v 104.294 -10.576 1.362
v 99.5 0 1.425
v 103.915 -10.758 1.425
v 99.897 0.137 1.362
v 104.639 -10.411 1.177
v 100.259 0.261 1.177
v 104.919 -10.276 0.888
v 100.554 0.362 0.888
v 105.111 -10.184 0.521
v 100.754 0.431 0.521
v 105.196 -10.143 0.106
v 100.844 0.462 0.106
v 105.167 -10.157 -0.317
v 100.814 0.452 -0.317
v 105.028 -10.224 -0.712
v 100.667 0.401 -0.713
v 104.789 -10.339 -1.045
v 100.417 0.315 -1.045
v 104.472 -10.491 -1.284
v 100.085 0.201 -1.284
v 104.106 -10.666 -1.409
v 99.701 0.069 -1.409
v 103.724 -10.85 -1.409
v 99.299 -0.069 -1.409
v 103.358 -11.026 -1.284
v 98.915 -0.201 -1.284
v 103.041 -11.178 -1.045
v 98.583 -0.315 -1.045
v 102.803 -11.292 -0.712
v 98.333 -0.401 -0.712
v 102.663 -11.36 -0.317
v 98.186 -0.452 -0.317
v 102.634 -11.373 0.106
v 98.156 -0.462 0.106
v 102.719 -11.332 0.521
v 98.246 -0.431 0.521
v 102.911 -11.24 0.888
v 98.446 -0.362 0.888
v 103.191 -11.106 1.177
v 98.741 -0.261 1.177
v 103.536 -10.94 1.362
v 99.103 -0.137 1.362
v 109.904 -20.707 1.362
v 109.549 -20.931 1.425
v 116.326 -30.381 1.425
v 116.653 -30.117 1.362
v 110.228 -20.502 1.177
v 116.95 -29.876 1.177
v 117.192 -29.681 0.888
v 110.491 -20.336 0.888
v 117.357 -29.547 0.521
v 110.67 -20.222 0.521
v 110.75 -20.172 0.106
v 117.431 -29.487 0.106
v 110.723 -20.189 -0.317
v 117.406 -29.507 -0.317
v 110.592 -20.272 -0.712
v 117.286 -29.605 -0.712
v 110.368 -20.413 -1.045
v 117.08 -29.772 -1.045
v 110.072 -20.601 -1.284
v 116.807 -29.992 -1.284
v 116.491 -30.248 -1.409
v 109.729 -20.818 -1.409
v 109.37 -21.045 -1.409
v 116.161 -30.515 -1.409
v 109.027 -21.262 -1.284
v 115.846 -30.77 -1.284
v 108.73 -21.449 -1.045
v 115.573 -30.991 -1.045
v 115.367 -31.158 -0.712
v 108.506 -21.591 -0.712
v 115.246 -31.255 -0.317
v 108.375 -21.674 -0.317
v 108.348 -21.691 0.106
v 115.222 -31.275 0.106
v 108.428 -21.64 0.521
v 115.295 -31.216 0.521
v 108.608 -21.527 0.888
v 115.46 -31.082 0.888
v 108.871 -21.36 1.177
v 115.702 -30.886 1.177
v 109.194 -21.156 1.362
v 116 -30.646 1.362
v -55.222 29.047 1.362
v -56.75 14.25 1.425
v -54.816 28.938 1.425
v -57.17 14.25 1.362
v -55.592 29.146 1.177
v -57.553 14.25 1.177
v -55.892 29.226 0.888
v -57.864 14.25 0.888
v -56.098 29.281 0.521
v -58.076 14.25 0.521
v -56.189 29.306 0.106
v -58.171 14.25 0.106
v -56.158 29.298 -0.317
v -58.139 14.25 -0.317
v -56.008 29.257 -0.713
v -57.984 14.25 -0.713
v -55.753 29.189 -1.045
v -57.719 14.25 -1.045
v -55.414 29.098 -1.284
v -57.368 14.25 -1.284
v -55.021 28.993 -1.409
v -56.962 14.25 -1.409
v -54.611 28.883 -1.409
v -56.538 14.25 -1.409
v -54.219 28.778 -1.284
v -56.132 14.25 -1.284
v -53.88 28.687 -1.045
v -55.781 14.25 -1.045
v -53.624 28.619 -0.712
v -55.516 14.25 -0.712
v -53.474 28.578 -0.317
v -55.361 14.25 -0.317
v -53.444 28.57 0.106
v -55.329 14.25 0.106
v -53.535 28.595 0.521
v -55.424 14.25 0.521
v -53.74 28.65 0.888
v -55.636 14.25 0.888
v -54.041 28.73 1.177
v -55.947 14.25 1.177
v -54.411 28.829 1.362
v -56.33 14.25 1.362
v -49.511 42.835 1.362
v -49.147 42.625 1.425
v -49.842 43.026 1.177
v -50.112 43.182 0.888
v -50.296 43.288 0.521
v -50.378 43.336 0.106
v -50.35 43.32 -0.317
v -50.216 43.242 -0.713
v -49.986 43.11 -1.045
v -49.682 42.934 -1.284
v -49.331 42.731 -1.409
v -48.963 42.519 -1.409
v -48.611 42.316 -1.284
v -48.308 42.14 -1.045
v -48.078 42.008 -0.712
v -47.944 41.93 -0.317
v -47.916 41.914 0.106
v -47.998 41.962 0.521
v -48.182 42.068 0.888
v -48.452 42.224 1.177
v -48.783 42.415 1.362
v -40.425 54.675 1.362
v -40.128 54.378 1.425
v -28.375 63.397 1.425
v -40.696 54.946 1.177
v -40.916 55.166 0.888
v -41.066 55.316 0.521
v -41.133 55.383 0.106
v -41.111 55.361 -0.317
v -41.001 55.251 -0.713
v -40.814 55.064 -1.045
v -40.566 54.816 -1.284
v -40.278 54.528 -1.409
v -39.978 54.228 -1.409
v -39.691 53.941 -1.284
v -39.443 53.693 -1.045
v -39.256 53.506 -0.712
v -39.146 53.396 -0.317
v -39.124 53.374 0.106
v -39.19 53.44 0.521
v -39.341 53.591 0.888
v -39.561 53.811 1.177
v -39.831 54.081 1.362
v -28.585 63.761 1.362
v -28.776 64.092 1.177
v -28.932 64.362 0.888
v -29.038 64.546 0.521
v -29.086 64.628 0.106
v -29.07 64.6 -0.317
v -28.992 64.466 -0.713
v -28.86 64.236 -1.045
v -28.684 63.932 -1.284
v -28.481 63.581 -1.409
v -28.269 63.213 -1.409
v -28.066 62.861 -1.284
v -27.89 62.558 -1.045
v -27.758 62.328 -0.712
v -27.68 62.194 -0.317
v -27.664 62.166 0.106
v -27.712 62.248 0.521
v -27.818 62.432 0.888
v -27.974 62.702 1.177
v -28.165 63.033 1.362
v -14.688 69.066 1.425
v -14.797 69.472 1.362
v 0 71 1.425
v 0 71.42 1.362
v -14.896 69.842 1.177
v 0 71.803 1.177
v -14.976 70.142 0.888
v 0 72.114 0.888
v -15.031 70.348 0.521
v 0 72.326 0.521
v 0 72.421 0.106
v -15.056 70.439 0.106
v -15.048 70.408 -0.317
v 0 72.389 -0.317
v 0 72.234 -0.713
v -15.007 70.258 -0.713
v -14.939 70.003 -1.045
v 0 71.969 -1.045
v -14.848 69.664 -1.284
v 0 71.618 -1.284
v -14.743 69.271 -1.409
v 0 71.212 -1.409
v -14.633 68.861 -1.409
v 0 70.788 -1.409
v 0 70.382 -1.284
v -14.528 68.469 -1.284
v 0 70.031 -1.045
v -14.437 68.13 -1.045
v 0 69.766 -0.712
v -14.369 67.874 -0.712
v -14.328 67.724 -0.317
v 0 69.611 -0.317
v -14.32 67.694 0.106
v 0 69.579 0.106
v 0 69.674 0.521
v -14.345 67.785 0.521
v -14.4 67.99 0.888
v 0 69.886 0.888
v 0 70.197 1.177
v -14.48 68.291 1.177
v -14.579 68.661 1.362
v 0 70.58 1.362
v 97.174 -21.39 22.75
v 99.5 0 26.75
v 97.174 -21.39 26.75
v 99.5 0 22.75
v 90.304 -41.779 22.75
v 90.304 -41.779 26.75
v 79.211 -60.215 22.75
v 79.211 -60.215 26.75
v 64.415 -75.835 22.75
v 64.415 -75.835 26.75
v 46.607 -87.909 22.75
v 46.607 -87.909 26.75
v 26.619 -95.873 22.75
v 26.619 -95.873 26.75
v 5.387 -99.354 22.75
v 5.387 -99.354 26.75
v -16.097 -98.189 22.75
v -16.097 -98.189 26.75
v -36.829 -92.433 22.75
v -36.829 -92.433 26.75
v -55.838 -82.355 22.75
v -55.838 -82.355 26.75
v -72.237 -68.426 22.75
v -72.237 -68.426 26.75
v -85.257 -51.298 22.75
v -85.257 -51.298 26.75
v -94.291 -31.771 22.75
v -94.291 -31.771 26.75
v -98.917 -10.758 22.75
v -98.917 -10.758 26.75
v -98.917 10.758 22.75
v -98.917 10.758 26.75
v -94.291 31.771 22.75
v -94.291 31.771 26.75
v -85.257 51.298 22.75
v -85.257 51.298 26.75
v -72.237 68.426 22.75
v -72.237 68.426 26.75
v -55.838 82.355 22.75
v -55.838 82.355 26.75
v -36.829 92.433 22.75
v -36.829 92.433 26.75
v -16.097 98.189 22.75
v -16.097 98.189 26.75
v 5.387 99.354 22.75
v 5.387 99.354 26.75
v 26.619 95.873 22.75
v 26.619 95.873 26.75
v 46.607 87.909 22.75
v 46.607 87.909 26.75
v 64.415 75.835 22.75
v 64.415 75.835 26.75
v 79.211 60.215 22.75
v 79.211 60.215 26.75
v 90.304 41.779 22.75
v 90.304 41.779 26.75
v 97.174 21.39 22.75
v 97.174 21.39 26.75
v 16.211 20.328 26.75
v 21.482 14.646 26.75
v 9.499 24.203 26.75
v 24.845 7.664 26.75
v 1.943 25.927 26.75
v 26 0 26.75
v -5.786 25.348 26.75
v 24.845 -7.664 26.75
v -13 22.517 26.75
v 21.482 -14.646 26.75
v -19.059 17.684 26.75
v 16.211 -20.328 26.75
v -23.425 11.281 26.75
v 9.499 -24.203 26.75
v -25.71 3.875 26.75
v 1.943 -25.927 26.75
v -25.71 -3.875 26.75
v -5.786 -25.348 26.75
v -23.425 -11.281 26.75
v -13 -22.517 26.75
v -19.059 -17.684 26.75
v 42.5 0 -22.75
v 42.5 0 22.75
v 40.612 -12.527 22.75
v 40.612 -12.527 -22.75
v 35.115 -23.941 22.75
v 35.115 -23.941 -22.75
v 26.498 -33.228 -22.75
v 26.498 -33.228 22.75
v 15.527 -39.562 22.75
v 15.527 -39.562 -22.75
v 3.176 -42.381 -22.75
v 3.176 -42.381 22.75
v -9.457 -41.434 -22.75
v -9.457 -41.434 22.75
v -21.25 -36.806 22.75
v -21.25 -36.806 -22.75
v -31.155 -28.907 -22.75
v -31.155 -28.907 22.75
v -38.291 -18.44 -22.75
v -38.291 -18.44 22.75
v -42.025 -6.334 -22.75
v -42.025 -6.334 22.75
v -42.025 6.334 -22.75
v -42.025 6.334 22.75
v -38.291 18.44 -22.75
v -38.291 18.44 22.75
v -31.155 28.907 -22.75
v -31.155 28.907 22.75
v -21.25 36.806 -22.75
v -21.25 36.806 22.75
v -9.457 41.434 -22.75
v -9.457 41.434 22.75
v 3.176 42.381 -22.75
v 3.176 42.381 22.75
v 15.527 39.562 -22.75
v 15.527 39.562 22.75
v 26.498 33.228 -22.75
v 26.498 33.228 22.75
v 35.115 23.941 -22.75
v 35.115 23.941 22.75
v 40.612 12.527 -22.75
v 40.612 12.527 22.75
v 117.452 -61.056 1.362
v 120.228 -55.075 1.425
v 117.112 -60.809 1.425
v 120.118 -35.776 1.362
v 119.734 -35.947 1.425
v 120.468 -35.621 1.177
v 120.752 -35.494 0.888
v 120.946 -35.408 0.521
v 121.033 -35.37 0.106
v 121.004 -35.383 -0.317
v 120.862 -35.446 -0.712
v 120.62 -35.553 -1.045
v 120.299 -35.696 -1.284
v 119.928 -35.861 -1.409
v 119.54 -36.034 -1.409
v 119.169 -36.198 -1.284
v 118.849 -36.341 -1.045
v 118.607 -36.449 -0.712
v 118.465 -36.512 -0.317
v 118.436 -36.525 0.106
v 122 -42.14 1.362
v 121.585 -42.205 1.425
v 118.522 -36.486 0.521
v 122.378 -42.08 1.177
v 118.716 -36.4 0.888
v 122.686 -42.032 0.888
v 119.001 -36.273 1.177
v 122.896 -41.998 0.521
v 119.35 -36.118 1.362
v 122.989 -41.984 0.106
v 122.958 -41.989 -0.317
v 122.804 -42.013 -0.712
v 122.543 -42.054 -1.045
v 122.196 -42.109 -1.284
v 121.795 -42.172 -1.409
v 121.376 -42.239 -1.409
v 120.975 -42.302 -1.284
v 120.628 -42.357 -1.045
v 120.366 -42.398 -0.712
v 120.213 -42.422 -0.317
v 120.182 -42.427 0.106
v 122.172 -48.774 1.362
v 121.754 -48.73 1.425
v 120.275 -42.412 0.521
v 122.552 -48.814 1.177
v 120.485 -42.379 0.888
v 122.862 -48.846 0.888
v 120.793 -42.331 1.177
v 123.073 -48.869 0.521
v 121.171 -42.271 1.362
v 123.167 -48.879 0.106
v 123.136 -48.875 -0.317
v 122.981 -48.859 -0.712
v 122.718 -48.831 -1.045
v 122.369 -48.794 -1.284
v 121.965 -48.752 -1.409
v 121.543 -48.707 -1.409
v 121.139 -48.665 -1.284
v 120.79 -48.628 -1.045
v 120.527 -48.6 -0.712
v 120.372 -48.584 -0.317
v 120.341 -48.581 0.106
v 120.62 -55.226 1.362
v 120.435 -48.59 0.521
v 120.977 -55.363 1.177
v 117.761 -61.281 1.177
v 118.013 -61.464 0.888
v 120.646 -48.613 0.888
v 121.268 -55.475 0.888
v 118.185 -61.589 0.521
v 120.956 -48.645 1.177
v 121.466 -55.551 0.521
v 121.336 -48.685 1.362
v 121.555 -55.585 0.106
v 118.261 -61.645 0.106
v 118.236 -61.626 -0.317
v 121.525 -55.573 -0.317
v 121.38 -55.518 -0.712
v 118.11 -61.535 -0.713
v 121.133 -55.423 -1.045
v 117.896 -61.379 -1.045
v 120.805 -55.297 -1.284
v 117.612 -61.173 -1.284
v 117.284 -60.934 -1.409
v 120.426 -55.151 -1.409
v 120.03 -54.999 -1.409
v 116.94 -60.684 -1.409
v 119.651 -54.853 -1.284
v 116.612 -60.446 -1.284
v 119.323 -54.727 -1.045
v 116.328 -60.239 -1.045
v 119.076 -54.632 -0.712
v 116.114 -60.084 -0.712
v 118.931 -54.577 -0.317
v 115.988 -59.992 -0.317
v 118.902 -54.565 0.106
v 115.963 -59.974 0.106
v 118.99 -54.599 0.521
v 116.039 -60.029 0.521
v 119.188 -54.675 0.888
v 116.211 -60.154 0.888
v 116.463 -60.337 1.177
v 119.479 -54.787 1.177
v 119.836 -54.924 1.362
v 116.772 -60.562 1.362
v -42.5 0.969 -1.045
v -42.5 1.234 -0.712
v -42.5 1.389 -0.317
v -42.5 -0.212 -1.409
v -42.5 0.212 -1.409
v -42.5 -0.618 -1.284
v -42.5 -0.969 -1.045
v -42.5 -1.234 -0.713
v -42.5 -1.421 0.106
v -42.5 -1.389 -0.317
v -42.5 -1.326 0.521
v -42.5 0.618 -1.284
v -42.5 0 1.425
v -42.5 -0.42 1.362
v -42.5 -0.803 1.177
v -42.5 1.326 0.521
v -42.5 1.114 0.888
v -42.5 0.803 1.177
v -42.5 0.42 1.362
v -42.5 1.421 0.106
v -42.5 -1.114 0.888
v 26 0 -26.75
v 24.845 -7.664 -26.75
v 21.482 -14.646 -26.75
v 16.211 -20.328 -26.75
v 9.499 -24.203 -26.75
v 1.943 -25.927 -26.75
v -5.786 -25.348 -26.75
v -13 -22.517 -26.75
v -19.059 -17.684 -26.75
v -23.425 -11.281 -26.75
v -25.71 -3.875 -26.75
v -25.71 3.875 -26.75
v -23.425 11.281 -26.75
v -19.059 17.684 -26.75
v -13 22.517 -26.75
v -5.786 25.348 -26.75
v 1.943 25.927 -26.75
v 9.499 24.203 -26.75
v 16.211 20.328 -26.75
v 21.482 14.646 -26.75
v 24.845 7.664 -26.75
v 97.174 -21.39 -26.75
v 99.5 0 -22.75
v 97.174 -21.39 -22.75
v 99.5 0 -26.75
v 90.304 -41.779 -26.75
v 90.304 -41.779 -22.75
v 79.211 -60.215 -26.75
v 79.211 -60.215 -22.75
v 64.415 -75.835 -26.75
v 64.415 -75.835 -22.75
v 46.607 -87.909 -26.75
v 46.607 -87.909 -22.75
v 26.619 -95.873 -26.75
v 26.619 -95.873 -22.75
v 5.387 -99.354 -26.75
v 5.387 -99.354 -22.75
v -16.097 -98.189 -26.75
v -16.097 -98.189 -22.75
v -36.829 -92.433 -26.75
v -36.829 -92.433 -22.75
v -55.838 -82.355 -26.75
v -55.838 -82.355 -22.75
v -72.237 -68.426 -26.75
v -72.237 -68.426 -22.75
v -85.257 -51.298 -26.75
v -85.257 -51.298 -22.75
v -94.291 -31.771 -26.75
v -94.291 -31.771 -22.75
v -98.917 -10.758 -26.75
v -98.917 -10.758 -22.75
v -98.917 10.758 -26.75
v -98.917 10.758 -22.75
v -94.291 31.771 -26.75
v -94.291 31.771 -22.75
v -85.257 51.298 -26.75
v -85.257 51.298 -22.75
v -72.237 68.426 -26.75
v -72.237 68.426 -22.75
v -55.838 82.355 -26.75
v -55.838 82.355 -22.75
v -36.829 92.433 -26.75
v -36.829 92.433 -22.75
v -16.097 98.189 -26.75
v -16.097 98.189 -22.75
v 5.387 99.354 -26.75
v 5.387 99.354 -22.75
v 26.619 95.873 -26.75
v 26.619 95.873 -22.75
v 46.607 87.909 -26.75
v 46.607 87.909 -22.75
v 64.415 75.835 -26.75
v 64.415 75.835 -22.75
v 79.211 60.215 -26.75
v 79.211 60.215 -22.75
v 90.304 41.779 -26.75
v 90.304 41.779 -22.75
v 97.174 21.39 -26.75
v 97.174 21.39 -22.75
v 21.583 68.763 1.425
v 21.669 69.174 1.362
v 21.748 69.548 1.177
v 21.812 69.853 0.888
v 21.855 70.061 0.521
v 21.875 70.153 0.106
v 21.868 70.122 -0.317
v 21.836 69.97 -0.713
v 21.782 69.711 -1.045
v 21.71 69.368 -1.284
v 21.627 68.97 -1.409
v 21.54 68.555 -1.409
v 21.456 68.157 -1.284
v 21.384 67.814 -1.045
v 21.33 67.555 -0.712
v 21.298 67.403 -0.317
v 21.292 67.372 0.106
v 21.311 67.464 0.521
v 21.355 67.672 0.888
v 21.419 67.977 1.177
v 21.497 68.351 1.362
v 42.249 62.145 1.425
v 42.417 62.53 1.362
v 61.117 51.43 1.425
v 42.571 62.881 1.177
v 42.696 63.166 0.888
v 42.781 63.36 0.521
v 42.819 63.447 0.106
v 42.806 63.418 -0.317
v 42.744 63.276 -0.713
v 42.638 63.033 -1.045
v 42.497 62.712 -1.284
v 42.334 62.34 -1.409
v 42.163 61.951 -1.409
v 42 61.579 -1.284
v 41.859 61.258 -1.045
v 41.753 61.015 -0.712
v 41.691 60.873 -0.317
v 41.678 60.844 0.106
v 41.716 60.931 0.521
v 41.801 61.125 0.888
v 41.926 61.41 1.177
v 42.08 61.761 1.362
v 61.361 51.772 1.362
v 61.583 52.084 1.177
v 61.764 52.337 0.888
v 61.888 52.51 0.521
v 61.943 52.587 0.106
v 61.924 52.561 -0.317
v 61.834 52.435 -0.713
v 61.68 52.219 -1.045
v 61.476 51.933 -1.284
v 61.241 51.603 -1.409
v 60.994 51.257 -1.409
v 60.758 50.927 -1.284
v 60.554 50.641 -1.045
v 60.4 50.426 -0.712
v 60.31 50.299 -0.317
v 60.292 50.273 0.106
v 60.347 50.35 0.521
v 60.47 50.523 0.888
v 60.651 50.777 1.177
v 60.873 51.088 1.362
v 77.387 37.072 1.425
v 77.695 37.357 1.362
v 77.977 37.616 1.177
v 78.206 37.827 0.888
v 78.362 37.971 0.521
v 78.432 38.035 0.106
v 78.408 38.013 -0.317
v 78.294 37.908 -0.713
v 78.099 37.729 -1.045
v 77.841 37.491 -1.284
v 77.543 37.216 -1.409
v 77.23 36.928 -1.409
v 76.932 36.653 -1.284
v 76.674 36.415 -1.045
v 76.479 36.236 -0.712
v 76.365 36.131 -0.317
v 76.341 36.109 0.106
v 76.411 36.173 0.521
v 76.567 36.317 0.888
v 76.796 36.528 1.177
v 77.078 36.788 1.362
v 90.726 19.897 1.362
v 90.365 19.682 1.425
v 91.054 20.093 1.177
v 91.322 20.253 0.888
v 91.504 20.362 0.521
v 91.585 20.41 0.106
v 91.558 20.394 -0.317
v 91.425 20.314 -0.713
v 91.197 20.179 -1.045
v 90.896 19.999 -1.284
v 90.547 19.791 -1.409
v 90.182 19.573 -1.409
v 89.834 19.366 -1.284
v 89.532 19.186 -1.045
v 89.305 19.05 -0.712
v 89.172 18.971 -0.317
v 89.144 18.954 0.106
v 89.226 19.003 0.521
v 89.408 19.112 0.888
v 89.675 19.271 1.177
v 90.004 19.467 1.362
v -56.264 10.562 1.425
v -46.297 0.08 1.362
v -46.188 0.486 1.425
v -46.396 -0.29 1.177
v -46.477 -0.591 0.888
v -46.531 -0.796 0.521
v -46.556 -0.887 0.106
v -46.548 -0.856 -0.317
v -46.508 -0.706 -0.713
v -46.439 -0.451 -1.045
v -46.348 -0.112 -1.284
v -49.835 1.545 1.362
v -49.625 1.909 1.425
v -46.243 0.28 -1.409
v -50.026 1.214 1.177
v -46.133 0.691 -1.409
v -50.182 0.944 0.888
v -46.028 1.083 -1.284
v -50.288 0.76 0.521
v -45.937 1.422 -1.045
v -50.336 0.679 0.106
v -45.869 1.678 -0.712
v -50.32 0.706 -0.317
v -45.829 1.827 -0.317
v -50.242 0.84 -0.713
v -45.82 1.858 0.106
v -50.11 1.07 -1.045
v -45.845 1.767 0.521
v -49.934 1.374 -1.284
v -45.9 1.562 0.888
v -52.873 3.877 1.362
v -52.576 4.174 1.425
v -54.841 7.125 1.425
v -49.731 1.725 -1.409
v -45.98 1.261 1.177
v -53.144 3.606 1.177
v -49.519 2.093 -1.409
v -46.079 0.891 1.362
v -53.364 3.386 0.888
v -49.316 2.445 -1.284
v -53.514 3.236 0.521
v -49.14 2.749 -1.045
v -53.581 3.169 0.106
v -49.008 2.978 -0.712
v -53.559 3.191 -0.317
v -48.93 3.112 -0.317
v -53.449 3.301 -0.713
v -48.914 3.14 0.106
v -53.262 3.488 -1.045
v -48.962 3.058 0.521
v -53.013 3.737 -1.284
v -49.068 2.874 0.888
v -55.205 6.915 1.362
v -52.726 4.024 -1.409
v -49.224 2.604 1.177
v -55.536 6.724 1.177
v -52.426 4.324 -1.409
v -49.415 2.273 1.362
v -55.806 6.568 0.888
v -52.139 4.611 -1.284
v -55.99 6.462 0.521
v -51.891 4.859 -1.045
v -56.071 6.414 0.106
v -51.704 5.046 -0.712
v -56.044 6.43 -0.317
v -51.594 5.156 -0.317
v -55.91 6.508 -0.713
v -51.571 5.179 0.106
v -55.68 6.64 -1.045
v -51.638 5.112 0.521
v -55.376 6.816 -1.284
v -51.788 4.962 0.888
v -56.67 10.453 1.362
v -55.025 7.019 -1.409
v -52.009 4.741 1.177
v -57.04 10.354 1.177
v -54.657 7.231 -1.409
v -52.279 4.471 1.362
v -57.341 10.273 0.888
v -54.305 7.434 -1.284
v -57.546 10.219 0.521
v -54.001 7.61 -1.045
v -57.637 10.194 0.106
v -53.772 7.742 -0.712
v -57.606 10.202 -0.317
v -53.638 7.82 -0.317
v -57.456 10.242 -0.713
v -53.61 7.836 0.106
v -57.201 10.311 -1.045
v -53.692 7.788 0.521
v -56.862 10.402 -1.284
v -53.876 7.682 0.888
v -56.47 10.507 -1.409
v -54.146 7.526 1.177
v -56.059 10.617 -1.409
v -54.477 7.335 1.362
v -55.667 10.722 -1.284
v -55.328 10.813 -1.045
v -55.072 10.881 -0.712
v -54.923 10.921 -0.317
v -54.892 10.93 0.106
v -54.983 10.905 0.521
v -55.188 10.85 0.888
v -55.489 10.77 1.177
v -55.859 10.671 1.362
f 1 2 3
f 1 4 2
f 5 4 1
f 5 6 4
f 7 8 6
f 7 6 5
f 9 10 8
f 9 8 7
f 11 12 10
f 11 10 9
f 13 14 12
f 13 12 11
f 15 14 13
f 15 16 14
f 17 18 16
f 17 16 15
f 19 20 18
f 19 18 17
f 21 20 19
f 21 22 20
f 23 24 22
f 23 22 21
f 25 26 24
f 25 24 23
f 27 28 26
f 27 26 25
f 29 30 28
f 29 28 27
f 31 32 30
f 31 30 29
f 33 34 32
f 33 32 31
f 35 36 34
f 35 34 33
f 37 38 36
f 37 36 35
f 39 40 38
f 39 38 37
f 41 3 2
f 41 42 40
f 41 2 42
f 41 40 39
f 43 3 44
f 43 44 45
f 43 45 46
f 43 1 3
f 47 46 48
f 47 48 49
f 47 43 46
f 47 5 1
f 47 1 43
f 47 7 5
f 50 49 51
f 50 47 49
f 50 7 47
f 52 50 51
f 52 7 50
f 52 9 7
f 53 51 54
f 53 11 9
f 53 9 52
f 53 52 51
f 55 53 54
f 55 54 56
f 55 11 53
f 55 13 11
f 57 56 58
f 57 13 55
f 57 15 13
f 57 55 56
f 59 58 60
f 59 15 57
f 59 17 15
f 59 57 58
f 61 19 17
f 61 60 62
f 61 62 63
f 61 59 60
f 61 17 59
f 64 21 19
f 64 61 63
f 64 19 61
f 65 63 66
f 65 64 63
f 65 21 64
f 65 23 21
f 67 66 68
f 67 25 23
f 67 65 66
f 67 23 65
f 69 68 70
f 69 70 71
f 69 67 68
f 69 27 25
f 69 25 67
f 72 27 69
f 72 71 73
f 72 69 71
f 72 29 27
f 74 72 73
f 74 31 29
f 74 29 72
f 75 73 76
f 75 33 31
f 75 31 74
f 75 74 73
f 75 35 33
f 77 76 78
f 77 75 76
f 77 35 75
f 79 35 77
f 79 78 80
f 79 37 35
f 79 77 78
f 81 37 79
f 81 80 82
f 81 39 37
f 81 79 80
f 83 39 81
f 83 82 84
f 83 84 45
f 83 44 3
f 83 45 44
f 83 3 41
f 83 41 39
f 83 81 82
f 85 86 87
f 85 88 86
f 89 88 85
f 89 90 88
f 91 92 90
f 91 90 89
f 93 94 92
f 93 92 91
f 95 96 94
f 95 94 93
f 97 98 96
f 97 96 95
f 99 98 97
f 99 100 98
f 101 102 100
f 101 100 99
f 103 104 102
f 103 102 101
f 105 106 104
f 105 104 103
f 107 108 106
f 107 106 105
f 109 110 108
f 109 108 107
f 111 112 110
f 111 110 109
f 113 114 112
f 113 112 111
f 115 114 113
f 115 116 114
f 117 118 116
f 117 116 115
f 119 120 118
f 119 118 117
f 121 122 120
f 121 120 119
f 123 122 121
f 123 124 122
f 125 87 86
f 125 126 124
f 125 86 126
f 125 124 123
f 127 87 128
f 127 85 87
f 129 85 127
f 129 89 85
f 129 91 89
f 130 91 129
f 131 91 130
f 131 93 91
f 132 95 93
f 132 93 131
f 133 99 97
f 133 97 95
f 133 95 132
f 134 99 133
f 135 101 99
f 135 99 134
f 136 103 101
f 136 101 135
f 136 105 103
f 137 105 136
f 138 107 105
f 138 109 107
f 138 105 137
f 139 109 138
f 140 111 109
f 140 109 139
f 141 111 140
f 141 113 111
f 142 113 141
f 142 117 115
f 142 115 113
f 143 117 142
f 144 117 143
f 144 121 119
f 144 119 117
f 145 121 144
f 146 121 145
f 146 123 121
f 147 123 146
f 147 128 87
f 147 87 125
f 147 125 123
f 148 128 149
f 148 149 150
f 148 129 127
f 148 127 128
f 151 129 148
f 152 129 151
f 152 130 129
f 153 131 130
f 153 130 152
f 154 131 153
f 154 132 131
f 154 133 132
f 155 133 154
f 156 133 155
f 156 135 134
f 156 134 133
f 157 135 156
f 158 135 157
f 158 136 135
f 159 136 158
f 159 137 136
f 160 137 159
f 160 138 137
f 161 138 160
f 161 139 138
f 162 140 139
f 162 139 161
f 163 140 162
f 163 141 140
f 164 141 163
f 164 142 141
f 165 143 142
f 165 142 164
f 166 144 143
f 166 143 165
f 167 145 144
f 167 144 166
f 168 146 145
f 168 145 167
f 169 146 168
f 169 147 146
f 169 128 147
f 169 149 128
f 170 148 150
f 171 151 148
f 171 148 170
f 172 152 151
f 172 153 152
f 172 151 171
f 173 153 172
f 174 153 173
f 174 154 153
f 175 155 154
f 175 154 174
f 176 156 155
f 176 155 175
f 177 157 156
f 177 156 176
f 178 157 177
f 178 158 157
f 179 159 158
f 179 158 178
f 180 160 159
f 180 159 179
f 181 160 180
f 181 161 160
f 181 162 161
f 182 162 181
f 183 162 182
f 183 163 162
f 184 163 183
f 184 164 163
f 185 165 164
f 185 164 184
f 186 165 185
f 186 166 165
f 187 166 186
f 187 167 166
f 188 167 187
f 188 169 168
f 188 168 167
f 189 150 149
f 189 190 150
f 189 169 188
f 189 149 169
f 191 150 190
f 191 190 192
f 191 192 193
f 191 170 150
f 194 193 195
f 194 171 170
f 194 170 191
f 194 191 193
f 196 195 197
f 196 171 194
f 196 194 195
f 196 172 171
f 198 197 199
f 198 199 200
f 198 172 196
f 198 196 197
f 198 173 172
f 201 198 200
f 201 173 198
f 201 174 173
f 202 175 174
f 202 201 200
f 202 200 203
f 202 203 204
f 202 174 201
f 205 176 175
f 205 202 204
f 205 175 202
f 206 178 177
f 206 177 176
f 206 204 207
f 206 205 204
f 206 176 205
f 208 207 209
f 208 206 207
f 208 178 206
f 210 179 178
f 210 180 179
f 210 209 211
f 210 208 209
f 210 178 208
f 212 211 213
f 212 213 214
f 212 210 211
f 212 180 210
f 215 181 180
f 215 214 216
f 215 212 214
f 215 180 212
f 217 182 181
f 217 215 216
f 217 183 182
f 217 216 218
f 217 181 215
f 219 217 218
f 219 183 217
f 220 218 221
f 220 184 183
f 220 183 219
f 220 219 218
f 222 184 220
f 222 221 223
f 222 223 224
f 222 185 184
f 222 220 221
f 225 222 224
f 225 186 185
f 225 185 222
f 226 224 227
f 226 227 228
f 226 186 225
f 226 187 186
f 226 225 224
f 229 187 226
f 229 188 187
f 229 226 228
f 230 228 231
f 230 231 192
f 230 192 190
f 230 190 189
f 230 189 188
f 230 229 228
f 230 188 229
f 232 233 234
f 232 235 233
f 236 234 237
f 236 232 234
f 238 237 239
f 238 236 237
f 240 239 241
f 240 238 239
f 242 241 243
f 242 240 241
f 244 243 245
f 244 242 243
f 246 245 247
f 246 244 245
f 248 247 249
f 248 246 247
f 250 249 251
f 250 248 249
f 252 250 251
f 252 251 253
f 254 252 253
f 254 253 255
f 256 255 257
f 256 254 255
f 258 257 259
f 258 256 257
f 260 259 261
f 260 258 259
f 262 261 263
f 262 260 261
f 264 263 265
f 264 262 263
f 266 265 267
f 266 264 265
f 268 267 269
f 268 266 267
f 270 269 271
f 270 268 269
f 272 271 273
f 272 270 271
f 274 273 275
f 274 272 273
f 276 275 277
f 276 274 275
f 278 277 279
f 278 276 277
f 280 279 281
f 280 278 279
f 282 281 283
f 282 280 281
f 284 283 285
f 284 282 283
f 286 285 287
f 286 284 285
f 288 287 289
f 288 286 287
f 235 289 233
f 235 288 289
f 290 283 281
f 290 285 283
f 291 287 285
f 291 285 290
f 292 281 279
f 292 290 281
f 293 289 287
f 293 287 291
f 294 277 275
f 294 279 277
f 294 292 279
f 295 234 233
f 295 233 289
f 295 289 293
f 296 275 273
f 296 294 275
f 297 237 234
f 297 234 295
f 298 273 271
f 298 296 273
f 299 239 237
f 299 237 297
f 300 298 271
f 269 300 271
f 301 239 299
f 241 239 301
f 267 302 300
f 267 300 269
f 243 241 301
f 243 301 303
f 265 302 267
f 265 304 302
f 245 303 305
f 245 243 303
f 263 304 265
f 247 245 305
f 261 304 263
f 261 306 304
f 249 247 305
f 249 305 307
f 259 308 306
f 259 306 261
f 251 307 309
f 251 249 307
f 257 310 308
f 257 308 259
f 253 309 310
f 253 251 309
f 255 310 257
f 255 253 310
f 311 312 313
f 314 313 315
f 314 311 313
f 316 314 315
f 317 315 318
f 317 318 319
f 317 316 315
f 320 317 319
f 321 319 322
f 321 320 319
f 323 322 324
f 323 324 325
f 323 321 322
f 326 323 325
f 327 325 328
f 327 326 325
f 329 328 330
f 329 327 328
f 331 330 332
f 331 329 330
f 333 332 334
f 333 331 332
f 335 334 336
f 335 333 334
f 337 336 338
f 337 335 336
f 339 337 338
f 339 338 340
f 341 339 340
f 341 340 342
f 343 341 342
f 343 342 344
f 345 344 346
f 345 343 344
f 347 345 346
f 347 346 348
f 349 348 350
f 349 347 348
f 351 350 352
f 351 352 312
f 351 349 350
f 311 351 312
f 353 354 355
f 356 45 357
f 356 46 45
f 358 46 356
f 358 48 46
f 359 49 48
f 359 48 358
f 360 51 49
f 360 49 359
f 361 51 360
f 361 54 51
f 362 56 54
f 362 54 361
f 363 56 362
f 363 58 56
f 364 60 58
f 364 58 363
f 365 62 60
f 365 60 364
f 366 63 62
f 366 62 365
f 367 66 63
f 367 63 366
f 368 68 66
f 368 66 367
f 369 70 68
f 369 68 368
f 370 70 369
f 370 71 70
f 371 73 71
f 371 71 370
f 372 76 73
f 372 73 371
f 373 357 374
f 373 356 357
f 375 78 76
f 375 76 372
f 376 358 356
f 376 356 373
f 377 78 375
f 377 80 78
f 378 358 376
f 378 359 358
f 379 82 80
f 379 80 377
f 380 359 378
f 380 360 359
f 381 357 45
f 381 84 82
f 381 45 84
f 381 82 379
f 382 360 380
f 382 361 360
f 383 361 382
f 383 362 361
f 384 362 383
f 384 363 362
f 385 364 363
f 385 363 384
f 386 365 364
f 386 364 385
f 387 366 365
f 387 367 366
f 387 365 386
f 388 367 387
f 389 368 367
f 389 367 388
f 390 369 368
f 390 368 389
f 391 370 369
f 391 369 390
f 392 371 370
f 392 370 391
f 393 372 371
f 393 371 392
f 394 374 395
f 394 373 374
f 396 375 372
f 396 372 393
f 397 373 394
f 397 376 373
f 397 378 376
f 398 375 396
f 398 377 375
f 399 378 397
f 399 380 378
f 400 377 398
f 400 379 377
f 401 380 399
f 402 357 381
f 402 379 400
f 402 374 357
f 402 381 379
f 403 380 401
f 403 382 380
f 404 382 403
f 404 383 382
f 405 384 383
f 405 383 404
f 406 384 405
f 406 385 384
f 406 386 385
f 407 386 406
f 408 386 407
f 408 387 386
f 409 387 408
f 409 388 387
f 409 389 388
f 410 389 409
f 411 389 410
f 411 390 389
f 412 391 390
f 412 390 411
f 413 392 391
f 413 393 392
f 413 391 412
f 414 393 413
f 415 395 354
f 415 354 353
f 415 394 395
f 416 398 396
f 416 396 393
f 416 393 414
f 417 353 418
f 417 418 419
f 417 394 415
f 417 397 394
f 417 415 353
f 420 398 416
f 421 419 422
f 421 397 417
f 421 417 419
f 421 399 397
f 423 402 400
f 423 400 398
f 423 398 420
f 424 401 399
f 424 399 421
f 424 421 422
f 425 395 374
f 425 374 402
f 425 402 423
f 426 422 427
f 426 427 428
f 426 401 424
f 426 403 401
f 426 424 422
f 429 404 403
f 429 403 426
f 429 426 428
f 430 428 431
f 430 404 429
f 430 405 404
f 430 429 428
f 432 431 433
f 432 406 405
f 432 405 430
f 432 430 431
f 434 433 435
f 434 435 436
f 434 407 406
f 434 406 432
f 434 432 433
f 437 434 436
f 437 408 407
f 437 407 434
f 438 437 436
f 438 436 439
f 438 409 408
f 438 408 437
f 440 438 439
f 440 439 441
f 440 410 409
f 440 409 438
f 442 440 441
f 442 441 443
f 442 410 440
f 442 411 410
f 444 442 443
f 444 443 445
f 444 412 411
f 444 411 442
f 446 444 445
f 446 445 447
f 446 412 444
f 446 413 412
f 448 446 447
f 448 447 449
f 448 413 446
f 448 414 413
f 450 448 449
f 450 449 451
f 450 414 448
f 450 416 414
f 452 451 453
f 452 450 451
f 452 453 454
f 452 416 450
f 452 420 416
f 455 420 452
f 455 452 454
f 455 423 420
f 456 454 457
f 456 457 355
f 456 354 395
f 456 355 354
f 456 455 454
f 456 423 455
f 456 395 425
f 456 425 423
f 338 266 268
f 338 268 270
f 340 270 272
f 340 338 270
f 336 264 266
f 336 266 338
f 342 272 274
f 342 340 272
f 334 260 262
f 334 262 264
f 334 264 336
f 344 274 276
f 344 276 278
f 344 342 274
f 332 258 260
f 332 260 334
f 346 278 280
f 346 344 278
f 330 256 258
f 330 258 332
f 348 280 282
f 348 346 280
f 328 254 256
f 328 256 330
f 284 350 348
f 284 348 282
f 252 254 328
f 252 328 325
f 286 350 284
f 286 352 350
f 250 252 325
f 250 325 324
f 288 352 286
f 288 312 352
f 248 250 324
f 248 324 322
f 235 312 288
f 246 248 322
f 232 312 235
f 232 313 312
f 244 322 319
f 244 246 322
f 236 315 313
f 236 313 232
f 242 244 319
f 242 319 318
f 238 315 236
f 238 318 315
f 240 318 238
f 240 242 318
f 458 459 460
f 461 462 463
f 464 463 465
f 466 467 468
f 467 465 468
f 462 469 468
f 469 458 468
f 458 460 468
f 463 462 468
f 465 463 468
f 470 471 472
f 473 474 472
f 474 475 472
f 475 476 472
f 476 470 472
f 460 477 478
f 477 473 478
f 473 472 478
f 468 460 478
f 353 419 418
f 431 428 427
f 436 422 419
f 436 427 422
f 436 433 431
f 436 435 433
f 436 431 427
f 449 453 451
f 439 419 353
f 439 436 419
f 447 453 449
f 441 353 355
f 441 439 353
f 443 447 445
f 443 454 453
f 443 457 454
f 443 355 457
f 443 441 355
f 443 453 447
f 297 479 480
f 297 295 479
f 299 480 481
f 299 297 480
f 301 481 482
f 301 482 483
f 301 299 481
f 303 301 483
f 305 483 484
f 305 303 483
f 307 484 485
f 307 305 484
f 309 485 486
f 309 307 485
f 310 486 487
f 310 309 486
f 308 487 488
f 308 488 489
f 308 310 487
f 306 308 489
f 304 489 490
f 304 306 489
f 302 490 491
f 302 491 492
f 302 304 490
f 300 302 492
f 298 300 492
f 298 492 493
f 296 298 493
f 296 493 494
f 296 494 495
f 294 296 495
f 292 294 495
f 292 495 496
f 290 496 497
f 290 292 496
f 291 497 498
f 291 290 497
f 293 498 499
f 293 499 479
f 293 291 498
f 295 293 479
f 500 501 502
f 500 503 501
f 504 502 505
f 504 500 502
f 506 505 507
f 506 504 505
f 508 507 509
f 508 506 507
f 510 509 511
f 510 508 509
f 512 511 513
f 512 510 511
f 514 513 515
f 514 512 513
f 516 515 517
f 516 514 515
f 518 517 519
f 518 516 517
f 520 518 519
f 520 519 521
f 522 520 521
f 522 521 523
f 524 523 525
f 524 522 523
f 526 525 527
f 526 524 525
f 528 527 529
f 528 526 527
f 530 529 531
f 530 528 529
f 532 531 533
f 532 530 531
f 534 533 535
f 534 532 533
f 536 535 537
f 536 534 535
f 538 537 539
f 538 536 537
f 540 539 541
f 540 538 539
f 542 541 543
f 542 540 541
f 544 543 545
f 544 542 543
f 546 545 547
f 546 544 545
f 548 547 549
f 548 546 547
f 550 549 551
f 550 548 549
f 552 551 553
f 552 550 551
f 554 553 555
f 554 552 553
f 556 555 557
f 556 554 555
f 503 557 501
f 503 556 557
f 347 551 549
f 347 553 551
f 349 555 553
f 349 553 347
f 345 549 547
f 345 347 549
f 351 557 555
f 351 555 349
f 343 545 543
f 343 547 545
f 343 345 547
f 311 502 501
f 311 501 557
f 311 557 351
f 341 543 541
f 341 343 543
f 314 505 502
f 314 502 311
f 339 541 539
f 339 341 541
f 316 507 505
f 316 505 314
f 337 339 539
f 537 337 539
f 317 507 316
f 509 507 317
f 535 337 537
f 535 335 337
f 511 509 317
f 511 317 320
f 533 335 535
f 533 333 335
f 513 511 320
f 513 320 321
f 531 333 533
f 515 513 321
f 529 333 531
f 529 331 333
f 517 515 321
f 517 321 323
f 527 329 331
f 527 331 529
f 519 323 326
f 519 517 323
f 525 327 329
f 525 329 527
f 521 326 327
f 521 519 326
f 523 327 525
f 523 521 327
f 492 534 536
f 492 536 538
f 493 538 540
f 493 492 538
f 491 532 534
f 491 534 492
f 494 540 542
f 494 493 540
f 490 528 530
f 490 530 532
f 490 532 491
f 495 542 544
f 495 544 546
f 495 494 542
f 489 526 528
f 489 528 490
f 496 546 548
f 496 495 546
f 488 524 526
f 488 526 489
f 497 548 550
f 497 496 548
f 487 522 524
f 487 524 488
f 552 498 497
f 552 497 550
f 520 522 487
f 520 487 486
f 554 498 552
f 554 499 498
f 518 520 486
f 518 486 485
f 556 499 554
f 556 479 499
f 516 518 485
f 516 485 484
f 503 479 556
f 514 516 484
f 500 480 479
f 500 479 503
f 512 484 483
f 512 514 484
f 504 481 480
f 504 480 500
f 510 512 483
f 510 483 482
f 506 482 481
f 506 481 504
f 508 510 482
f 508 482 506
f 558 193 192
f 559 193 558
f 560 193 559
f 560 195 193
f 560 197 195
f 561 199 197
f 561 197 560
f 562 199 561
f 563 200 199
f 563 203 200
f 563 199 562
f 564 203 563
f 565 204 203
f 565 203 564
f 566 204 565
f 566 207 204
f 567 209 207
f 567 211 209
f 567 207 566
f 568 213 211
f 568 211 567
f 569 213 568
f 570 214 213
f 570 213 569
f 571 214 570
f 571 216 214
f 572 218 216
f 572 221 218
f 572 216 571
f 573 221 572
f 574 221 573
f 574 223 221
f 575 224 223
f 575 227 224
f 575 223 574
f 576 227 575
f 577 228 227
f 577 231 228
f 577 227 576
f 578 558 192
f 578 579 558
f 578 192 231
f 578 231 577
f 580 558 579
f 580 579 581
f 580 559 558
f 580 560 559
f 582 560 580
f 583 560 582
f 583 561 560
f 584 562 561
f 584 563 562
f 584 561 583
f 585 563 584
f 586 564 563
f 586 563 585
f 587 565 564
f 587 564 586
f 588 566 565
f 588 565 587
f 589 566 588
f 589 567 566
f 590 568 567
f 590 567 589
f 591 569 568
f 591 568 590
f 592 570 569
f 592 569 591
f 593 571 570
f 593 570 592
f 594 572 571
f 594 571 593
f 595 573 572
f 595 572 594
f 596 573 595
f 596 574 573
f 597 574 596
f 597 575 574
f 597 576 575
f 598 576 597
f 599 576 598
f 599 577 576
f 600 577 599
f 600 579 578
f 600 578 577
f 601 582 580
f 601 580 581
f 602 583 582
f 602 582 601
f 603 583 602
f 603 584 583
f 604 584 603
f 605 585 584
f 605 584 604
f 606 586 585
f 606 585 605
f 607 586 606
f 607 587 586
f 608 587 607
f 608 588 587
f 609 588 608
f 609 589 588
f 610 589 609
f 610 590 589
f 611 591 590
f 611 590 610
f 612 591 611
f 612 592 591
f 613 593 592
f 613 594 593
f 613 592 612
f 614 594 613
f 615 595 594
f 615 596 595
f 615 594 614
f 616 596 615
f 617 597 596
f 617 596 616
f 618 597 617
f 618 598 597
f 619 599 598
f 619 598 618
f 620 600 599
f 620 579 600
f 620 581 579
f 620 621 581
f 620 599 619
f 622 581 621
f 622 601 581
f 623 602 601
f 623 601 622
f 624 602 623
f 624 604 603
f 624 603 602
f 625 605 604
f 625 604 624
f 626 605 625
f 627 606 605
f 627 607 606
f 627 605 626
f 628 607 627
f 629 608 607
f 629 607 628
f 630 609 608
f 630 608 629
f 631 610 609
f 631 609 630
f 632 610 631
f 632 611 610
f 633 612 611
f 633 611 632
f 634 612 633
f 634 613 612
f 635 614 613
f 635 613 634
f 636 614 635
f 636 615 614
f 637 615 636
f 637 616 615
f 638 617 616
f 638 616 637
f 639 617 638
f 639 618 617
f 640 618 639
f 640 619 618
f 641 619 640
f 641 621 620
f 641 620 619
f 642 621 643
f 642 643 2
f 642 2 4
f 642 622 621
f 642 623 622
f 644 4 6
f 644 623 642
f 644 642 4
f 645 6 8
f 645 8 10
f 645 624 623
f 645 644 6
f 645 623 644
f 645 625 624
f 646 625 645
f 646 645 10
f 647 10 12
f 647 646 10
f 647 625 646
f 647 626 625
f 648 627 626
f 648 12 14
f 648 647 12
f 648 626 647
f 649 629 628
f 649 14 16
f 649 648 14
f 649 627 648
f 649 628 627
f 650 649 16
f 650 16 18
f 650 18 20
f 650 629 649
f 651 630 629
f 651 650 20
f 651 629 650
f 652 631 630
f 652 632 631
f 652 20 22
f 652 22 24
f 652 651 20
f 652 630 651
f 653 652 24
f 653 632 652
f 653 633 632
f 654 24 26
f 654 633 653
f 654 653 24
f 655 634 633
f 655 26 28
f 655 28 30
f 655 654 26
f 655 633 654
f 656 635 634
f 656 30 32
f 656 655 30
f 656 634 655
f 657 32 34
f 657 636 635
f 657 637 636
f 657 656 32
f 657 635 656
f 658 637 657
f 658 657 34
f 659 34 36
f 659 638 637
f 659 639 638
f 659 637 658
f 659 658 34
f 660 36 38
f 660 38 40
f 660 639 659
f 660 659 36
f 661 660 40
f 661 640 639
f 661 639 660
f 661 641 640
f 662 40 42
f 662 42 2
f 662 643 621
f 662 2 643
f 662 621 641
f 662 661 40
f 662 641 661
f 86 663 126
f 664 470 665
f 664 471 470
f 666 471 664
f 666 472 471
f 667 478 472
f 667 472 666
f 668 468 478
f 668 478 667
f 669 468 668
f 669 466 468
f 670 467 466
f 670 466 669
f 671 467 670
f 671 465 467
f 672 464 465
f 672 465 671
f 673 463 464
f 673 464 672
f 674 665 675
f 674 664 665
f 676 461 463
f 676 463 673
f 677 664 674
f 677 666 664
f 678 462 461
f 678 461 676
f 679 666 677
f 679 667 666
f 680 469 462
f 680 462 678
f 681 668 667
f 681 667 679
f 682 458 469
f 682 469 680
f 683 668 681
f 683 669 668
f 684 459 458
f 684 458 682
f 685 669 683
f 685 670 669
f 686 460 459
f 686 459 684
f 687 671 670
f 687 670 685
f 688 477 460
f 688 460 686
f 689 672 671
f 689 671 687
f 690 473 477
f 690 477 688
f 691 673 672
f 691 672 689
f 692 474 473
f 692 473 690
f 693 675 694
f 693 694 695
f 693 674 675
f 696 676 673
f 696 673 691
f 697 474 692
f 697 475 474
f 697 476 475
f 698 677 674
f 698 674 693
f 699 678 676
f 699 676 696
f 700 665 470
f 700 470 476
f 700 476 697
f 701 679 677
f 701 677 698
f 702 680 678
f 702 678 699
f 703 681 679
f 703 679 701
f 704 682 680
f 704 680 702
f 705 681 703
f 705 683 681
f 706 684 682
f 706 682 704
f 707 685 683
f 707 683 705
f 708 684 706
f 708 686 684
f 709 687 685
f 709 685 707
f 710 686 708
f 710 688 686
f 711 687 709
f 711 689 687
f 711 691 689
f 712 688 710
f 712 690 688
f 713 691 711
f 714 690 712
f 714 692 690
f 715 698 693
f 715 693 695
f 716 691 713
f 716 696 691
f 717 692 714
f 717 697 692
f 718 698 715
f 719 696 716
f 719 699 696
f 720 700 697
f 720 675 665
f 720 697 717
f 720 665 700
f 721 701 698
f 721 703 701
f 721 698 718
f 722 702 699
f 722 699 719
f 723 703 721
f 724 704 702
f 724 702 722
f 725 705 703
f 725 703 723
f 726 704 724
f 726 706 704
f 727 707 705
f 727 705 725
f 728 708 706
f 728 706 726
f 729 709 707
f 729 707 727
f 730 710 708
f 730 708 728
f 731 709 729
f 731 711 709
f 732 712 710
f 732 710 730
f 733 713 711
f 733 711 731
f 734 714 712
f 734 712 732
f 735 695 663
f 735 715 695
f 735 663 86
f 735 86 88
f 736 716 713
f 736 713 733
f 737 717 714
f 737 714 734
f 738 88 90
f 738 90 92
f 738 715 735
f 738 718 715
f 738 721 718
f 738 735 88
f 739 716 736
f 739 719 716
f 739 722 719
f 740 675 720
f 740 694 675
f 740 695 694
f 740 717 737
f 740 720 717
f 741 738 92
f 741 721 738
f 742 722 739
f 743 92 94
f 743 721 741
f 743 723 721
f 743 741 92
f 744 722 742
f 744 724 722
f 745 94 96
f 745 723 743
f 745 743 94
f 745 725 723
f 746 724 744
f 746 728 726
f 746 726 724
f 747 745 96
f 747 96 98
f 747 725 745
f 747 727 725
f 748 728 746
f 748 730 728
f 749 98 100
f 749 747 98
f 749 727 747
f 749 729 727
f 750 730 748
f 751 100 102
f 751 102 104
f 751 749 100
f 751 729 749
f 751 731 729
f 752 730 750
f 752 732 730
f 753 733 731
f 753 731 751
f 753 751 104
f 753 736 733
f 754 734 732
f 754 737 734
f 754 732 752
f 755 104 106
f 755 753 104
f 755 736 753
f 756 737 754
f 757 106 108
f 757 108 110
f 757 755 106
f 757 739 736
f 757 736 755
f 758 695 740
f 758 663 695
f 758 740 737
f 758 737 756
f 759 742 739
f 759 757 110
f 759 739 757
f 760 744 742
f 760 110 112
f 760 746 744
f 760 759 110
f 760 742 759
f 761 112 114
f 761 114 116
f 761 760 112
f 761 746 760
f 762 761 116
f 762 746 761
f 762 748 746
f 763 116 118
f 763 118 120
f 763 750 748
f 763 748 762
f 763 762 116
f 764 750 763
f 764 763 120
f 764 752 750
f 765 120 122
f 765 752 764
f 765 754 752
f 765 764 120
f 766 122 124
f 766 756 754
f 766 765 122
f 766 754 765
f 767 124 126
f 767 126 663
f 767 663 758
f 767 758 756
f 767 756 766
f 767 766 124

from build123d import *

# Parameters (mm, degrees)
ESQUISSE3_R = 1.425


with BuildPart() as part:
    # Esquisse1 → Révolution1 (revolve)
    with BuildSketch(Plane(origin=(0, 0, 0), x_dir=(1, 0, 0), z_dir=(0, 1, 0))):
        Polygon((26, -26.75), (99.5, -26.75), (99.5, -22.75), (42.5, -22.75), (42.5, 22.75), (99.5, 22.75), (99.5, 26.75), (26, 26.75), align=None)
    revolve(axis=Axis((0, 0, 0), (0, 0, -1)))


with BuildPart() as body_2:
    # Balayage1: sweep along a path in Esquisse2
    with BuildLine(Plane.XY) as balayage1_path:
        ThreePointArc((-42.5, 0), (-52.576271632, 4.173728368), (-56.75, 14.25))
        ThreePointArc((-56.75, 14.25), (-40.128309832, 54.378309832), (0, 71))
        ThreePointArc((0, 71), (61.117202979, 51.430094316), (99.5, 0))
        ThreePointArc((99.5, 0), (106.584087108, -15.926727523), (116.326198226, -30.381353452))
        ThreePointArc((116.326198226, -30.381353452), (121.883490614, -45.461964379), (117.111892834, -60.809282688))
    # Esquisse3 → Balayage1 (sweep)
    with BuildSketch(Plane.ZY.offset(42.5)):
        Circle(ESQUISSE3_R)
    sweep(path=balayage1_path.line)


solid = Compound([part.part, body_2.part])
